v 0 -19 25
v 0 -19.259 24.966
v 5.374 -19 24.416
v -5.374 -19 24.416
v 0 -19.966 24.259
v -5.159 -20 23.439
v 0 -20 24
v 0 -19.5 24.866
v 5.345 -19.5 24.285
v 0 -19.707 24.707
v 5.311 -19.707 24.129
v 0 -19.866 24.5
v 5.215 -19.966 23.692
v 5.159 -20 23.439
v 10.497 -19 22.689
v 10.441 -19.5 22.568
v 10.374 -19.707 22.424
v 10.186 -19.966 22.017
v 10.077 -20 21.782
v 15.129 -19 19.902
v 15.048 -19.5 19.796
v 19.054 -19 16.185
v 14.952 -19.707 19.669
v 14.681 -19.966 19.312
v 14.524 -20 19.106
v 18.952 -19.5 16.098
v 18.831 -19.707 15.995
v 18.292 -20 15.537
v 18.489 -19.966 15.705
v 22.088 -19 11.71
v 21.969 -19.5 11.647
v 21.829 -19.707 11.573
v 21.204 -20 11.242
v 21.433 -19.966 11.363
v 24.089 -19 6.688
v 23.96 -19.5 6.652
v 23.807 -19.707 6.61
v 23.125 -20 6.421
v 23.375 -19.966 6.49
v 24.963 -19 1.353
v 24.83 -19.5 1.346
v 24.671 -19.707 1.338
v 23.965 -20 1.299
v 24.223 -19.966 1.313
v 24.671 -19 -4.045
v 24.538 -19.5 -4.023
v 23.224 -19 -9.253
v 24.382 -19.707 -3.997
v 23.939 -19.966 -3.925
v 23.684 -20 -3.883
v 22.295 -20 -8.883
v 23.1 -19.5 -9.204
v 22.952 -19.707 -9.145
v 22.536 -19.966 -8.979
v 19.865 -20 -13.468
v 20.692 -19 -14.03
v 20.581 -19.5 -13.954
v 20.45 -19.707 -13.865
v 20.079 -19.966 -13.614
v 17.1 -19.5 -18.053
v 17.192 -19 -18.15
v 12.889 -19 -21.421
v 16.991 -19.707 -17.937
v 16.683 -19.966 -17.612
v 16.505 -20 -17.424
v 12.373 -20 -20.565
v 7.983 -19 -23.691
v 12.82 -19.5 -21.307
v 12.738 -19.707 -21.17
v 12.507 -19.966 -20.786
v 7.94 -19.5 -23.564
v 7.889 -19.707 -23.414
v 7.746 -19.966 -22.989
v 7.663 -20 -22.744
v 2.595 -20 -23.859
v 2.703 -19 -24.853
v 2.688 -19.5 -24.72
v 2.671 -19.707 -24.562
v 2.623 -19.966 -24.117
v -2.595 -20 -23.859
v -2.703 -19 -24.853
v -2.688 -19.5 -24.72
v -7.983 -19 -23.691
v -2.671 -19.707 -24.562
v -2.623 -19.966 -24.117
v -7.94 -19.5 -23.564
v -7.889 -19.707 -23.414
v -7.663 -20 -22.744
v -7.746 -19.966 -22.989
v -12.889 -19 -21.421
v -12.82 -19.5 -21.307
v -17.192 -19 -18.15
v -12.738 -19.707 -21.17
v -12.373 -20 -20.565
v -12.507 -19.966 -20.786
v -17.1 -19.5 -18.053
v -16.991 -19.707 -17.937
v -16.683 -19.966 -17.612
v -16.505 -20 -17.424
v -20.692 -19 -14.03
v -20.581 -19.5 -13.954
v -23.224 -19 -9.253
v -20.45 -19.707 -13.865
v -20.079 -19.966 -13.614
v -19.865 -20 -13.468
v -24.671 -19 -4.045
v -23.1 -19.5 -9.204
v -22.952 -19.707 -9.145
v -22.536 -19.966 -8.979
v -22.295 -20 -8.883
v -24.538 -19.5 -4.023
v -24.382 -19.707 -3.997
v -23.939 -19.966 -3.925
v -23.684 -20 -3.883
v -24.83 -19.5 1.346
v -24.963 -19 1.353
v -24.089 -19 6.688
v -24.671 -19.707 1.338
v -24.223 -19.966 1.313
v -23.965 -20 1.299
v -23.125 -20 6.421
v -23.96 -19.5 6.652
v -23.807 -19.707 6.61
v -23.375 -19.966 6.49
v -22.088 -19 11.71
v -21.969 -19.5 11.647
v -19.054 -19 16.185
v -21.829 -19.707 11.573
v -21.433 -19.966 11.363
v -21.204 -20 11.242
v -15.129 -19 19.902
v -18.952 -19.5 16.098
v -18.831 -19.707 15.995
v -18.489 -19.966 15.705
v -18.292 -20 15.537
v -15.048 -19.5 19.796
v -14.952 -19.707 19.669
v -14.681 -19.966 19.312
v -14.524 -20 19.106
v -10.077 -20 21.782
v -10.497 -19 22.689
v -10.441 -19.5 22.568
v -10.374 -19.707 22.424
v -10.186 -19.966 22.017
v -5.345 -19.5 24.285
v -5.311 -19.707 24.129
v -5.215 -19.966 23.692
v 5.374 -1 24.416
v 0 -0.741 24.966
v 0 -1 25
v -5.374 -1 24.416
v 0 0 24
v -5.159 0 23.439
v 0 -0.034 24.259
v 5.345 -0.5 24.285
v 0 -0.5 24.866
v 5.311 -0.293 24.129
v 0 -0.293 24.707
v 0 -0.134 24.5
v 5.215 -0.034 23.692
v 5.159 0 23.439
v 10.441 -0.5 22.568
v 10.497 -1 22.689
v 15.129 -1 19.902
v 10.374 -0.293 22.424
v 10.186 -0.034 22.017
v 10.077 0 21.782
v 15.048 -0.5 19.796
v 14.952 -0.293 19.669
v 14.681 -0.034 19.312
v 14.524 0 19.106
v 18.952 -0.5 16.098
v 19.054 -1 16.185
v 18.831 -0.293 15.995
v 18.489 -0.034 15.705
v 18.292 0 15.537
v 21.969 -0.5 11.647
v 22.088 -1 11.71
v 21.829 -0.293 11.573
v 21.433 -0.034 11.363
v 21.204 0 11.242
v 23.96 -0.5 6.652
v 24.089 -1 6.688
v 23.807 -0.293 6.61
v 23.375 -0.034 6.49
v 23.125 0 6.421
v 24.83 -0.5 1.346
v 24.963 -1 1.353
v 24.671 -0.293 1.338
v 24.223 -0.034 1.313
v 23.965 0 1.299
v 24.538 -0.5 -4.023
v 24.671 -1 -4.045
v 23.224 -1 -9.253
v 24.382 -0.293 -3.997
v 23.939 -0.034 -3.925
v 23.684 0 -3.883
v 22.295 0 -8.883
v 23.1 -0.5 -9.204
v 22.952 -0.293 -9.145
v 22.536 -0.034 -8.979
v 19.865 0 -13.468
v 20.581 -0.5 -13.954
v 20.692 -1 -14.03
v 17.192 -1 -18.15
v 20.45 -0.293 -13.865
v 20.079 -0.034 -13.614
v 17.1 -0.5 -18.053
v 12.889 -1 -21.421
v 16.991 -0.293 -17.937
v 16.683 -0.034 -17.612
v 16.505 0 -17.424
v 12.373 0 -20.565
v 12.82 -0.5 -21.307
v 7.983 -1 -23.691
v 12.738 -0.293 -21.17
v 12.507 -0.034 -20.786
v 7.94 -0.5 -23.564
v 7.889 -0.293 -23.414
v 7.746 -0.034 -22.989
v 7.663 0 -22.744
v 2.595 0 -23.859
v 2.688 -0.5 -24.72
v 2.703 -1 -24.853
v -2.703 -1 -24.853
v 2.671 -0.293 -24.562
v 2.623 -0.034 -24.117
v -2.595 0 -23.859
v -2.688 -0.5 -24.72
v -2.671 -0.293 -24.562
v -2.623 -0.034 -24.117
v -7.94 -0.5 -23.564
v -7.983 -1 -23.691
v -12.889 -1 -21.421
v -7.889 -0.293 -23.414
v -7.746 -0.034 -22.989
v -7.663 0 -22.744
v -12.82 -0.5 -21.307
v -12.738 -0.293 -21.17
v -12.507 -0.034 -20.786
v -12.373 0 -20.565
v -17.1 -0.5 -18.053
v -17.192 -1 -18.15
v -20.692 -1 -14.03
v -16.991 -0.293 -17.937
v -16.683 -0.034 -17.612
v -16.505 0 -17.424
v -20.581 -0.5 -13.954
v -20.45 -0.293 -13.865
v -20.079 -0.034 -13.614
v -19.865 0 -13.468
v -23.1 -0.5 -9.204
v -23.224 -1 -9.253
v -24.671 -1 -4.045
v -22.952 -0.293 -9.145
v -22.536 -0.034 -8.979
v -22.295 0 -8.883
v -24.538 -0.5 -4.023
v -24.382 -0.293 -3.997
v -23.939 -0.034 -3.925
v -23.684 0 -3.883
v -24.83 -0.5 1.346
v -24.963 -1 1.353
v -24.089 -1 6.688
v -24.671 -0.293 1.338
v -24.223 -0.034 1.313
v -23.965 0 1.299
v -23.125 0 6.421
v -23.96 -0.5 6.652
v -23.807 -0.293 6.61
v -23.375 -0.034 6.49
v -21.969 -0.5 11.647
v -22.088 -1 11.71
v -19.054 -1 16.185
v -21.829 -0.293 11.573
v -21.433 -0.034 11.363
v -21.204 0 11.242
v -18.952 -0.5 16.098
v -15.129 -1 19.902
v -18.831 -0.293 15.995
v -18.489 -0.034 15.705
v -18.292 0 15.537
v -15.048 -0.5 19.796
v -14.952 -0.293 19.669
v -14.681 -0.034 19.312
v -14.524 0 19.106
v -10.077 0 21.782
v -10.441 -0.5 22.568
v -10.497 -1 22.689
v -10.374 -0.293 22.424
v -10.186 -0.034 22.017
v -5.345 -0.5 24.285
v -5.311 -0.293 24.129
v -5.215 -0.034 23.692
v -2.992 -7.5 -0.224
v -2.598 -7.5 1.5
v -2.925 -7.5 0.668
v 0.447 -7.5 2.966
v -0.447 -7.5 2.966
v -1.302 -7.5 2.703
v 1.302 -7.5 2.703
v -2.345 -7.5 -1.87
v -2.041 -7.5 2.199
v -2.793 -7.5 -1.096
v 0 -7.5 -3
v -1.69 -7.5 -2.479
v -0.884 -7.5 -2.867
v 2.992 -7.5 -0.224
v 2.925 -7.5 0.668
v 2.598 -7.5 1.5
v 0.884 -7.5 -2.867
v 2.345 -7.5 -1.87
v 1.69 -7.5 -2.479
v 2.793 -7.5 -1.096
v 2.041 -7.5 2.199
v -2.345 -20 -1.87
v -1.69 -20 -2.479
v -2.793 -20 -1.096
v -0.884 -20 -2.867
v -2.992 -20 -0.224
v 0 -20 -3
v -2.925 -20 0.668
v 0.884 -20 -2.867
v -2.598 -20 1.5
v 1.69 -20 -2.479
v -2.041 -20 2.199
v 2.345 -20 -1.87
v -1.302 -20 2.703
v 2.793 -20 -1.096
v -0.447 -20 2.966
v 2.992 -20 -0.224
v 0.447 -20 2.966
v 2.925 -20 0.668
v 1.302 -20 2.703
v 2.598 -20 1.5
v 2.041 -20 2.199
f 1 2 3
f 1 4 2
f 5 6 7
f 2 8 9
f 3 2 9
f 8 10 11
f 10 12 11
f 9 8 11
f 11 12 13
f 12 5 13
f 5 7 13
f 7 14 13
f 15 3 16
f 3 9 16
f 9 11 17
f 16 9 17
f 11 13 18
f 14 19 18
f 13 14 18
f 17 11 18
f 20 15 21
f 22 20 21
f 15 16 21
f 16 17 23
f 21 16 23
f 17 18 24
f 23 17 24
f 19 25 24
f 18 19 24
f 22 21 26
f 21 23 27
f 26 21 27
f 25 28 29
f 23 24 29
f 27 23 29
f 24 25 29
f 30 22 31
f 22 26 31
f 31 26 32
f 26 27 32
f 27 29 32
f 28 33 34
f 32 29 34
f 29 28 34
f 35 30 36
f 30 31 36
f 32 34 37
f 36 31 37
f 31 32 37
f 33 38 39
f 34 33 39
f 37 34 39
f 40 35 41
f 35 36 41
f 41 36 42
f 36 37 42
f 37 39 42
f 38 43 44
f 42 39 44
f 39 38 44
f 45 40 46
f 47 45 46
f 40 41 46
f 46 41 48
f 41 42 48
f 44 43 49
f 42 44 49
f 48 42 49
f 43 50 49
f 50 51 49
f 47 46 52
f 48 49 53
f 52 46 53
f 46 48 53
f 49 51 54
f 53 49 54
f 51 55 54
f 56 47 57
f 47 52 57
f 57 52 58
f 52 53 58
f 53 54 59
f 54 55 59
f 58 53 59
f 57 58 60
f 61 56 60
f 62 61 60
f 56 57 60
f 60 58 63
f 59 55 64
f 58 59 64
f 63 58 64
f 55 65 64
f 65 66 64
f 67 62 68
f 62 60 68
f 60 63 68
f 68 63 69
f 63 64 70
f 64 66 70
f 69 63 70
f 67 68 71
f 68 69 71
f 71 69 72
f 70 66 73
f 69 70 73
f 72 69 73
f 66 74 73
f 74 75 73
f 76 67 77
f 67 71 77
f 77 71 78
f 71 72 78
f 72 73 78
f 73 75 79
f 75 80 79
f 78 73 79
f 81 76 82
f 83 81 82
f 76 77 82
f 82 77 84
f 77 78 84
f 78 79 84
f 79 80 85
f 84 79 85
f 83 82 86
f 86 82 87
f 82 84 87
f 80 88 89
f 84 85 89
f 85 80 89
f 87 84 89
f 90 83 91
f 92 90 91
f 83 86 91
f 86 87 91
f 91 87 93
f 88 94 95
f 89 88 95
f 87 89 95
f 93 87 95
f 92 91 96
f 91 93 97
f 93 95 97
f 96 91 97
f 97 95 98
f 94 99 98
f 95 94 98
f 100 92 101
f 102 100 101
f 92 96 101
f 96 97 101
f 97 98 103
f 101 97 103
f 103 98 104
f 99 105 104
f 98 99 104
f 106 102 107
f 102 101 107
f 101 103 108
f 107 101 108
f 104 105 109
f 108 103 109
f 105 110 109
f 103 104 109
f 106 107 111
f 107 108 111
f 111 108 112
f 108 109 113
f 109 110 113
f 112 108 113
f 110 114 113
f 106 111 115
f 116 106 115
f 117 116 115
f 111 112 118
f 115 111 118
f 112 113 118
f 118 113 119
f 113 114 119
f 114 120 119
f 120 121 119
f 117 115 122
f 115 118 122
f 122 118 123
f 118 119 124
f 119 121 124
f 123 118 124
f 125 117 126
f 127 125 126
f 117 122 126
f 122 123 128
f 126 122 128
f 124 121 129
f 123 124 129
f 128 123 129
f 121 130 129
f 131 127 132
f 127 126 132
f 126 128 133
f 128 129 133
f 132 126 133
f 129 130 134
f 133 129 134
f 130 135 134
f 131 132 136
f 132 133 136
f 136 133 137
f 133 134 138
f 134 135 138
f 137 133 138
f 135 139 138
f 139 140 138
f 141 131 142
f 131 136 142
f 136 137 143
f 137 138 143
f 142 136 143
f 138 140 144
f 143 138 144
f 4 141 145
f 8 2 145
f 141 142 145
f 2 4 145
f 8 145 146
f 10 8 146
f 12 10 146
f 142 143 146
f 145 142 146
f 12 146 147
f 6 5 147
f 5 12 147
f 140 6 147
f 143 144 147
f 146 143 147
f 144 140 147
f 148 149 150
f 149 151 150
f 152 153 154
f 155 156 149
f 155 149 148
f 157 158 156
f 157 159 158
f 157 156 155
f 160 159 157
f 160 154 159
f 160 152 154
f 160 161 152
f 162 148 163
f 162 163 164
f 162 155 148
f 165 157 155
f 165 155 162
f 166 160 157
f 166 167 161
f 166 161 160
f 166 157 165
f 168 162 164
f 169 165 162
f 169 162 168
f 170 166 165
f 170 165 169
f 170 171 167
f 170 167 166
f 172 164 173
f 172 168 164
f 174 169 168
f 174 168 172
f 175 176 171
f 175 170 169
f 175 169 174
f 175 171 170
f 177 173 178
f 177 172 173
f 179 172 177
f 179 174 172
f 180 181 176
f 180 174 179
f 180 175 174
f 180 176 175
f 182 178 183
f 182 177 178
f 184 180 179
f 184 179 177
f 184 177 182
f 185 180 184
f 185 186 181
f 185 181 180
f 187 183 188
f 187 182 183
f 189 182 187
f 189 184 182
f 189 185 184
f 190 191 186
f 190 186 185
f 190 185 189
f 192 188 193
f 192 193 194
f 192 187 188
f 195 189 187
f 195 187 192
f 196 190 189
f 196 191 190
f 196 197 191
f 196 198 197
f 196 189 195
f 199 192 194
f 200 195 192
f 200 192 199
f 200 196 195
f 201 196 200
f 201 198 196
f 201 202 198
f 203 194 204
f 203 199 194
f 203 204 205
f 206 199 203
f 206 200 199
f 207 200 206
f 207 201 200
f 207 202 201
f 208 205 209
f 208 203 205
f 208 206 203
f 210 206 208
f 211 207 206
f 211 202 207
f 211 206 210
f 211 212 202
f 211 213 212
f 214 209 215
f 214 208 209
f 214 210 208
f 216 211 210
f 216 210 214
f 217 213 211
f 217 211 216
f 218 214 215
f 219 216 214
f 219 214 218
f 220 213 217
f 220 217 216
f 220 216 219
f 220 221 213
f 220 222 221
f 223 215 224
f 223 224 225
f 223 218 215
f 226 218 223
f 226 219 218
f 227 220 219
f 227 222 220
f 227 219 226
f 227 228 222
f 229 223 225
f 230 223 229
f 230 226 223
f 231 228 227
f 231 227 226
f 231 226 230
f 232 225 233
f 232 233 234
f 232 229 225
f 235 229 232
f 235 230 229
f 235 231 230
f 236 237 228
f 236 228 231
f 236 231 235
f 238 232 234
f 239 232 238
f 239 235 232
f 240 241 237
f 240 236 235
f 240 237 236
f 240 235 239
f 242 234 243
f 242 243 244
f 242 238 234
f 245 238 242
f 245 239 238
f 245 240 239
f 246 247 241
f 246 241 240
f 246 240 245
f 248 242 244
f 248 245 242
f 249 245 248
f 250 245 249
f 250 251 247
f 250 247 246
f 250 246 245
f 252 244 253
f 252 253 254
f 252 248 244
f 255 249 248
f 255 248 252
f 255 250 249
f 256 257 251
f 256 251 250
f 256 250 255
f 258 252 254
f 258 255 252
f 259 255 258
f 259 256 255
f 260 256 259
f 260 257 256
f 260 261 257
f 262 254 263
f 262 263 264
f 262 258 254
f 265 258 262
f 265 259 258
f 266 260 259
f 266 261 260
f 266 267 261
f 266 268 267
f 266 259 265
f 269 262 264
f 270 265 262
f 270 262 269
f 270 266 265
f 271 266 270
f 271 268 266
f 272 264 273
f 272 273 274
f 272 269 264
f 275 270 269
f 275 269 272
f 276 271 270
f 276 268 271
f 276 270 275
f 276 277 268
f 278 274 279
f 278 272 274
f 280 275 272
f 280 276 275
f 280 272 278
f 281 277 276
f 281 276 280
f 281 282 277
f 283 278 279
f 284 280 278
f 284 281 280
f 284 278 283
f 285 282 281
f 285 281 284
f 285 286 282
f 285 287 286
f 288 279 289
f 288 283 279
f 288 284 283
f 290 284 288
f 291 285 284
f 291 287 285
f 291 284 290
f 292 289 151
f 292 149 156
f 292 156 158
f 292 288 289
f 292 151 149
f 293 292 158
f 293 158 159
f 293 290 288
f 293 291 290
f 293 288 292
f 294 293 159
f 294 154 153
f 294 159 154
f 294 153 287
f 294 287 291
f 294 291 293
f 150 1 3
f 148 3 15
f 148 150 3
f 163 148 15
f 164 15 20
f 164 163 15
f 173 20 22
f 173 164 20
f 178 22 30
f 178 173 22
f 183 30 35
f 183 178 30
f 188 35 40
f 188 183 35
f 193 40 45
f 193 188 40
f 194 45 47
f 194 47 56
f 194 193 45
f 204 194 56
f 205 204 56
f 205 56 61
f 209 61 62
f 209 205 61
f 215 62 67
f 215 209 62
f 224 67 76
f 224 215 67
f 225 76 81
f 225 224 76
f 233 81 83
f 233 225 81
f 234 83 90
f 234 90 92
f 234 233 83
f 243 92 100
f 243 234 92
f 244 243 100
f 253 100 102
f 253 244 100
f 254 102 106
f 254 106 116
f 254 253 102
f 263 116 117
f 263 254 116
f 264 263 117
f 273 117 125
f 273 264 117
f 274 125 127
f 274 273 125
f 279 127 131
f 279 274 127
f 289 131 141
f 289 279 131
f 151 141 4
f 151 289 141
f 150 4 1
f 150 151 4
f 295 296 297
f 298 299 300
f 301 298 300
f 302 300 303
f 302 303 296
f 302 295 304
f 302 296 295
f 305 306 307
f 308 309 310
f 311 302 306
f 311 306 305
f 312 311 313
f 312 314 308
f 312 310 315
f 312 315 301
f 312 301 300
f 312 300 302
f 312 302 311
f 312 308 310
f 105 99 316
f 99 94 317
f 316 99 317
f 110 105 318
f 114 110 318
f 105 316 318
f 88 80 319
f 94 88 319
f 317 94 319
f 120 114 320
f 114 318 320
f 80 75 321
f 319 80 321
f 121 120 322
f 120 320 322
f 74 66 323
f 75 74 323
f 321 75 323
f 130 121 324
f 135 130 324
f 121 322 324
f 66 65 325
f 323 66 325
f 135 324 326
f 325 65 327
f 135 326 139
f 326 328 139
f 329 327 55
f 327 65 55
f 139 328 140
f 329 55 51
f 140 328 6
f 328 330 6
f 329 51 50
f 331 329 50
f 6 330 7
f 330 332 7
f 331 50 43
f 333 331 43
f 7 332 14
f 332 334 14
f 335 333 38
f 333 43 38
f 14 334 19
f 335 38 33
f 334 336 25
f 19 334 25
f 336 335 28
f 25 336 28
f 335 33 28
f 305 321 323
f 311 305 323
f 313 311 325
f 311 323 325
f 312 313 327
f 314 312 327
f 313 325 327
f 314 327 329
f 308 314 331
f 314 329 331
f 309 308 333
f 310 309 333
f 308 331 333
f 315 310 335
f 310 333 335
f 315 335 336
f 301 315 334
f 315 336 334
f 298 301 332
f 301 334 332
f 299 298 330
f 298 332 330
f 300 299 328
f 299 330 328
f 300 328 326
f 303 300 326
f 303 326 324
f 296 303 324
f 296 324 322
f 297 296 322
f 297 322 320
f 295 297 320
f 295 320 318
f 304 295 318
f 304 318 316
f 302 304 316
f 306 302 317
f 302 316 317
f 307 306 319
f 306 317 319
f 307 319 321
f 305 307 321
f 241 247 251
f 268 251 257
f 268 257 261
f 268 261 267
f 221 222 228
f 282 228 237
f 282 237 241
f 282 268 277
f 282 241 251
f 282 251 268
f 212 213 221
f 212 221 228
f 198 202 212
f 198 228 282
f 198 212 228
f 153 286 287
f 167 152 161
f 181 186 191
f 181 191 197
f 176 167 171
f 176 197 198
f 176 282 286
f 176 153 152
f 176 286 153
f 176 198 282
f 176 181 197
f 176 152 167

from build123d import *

# Parameters (mm, degrees)
SKETCH1_R           = 25
BOSS_EXTRUDE1_DEPTH = 20
FILLET3_R           = 1
SKETCH2_R           = 3
CUT_EXTRUDE1_DEPTH  = 12.5


with BuildPart() as part:
    # Sketch1 → Boss-Extrude1 (new body)
    with BuildSketch(Plane(origin=(0, 0, 0), x_dir=(1, 0, 0), z_dir=(0, 1, 0))):
        with Locations(Location((0, 0, 0), (0, 0, 270))):
            Circle(SKETCH1_R)
    extrude(amount=-BOSS_EXTRUDE1_DEPTH)

    # Fillet3
    fillet3_edges = [part.edges().sort_by_distance(p)[0] for p in [
        (0, 0, -25),
        (0, -20, -25),
    ]]
    fillet(fillet3_edges, radius=FILLET3_R)

    # Sketch2 → Cut-Extrude1 (cut)
    with BuildSketch(Plane.XZ.offset(20)):
        with Locations(Location((0, 0, 0), (0, 0, 270))):
            Circle(SKETCH2_R)
    extrude(amount=-CUT_EXTRUDE1_DEPTH, mode=Mode.SUBTRACT)


solid = part.part
